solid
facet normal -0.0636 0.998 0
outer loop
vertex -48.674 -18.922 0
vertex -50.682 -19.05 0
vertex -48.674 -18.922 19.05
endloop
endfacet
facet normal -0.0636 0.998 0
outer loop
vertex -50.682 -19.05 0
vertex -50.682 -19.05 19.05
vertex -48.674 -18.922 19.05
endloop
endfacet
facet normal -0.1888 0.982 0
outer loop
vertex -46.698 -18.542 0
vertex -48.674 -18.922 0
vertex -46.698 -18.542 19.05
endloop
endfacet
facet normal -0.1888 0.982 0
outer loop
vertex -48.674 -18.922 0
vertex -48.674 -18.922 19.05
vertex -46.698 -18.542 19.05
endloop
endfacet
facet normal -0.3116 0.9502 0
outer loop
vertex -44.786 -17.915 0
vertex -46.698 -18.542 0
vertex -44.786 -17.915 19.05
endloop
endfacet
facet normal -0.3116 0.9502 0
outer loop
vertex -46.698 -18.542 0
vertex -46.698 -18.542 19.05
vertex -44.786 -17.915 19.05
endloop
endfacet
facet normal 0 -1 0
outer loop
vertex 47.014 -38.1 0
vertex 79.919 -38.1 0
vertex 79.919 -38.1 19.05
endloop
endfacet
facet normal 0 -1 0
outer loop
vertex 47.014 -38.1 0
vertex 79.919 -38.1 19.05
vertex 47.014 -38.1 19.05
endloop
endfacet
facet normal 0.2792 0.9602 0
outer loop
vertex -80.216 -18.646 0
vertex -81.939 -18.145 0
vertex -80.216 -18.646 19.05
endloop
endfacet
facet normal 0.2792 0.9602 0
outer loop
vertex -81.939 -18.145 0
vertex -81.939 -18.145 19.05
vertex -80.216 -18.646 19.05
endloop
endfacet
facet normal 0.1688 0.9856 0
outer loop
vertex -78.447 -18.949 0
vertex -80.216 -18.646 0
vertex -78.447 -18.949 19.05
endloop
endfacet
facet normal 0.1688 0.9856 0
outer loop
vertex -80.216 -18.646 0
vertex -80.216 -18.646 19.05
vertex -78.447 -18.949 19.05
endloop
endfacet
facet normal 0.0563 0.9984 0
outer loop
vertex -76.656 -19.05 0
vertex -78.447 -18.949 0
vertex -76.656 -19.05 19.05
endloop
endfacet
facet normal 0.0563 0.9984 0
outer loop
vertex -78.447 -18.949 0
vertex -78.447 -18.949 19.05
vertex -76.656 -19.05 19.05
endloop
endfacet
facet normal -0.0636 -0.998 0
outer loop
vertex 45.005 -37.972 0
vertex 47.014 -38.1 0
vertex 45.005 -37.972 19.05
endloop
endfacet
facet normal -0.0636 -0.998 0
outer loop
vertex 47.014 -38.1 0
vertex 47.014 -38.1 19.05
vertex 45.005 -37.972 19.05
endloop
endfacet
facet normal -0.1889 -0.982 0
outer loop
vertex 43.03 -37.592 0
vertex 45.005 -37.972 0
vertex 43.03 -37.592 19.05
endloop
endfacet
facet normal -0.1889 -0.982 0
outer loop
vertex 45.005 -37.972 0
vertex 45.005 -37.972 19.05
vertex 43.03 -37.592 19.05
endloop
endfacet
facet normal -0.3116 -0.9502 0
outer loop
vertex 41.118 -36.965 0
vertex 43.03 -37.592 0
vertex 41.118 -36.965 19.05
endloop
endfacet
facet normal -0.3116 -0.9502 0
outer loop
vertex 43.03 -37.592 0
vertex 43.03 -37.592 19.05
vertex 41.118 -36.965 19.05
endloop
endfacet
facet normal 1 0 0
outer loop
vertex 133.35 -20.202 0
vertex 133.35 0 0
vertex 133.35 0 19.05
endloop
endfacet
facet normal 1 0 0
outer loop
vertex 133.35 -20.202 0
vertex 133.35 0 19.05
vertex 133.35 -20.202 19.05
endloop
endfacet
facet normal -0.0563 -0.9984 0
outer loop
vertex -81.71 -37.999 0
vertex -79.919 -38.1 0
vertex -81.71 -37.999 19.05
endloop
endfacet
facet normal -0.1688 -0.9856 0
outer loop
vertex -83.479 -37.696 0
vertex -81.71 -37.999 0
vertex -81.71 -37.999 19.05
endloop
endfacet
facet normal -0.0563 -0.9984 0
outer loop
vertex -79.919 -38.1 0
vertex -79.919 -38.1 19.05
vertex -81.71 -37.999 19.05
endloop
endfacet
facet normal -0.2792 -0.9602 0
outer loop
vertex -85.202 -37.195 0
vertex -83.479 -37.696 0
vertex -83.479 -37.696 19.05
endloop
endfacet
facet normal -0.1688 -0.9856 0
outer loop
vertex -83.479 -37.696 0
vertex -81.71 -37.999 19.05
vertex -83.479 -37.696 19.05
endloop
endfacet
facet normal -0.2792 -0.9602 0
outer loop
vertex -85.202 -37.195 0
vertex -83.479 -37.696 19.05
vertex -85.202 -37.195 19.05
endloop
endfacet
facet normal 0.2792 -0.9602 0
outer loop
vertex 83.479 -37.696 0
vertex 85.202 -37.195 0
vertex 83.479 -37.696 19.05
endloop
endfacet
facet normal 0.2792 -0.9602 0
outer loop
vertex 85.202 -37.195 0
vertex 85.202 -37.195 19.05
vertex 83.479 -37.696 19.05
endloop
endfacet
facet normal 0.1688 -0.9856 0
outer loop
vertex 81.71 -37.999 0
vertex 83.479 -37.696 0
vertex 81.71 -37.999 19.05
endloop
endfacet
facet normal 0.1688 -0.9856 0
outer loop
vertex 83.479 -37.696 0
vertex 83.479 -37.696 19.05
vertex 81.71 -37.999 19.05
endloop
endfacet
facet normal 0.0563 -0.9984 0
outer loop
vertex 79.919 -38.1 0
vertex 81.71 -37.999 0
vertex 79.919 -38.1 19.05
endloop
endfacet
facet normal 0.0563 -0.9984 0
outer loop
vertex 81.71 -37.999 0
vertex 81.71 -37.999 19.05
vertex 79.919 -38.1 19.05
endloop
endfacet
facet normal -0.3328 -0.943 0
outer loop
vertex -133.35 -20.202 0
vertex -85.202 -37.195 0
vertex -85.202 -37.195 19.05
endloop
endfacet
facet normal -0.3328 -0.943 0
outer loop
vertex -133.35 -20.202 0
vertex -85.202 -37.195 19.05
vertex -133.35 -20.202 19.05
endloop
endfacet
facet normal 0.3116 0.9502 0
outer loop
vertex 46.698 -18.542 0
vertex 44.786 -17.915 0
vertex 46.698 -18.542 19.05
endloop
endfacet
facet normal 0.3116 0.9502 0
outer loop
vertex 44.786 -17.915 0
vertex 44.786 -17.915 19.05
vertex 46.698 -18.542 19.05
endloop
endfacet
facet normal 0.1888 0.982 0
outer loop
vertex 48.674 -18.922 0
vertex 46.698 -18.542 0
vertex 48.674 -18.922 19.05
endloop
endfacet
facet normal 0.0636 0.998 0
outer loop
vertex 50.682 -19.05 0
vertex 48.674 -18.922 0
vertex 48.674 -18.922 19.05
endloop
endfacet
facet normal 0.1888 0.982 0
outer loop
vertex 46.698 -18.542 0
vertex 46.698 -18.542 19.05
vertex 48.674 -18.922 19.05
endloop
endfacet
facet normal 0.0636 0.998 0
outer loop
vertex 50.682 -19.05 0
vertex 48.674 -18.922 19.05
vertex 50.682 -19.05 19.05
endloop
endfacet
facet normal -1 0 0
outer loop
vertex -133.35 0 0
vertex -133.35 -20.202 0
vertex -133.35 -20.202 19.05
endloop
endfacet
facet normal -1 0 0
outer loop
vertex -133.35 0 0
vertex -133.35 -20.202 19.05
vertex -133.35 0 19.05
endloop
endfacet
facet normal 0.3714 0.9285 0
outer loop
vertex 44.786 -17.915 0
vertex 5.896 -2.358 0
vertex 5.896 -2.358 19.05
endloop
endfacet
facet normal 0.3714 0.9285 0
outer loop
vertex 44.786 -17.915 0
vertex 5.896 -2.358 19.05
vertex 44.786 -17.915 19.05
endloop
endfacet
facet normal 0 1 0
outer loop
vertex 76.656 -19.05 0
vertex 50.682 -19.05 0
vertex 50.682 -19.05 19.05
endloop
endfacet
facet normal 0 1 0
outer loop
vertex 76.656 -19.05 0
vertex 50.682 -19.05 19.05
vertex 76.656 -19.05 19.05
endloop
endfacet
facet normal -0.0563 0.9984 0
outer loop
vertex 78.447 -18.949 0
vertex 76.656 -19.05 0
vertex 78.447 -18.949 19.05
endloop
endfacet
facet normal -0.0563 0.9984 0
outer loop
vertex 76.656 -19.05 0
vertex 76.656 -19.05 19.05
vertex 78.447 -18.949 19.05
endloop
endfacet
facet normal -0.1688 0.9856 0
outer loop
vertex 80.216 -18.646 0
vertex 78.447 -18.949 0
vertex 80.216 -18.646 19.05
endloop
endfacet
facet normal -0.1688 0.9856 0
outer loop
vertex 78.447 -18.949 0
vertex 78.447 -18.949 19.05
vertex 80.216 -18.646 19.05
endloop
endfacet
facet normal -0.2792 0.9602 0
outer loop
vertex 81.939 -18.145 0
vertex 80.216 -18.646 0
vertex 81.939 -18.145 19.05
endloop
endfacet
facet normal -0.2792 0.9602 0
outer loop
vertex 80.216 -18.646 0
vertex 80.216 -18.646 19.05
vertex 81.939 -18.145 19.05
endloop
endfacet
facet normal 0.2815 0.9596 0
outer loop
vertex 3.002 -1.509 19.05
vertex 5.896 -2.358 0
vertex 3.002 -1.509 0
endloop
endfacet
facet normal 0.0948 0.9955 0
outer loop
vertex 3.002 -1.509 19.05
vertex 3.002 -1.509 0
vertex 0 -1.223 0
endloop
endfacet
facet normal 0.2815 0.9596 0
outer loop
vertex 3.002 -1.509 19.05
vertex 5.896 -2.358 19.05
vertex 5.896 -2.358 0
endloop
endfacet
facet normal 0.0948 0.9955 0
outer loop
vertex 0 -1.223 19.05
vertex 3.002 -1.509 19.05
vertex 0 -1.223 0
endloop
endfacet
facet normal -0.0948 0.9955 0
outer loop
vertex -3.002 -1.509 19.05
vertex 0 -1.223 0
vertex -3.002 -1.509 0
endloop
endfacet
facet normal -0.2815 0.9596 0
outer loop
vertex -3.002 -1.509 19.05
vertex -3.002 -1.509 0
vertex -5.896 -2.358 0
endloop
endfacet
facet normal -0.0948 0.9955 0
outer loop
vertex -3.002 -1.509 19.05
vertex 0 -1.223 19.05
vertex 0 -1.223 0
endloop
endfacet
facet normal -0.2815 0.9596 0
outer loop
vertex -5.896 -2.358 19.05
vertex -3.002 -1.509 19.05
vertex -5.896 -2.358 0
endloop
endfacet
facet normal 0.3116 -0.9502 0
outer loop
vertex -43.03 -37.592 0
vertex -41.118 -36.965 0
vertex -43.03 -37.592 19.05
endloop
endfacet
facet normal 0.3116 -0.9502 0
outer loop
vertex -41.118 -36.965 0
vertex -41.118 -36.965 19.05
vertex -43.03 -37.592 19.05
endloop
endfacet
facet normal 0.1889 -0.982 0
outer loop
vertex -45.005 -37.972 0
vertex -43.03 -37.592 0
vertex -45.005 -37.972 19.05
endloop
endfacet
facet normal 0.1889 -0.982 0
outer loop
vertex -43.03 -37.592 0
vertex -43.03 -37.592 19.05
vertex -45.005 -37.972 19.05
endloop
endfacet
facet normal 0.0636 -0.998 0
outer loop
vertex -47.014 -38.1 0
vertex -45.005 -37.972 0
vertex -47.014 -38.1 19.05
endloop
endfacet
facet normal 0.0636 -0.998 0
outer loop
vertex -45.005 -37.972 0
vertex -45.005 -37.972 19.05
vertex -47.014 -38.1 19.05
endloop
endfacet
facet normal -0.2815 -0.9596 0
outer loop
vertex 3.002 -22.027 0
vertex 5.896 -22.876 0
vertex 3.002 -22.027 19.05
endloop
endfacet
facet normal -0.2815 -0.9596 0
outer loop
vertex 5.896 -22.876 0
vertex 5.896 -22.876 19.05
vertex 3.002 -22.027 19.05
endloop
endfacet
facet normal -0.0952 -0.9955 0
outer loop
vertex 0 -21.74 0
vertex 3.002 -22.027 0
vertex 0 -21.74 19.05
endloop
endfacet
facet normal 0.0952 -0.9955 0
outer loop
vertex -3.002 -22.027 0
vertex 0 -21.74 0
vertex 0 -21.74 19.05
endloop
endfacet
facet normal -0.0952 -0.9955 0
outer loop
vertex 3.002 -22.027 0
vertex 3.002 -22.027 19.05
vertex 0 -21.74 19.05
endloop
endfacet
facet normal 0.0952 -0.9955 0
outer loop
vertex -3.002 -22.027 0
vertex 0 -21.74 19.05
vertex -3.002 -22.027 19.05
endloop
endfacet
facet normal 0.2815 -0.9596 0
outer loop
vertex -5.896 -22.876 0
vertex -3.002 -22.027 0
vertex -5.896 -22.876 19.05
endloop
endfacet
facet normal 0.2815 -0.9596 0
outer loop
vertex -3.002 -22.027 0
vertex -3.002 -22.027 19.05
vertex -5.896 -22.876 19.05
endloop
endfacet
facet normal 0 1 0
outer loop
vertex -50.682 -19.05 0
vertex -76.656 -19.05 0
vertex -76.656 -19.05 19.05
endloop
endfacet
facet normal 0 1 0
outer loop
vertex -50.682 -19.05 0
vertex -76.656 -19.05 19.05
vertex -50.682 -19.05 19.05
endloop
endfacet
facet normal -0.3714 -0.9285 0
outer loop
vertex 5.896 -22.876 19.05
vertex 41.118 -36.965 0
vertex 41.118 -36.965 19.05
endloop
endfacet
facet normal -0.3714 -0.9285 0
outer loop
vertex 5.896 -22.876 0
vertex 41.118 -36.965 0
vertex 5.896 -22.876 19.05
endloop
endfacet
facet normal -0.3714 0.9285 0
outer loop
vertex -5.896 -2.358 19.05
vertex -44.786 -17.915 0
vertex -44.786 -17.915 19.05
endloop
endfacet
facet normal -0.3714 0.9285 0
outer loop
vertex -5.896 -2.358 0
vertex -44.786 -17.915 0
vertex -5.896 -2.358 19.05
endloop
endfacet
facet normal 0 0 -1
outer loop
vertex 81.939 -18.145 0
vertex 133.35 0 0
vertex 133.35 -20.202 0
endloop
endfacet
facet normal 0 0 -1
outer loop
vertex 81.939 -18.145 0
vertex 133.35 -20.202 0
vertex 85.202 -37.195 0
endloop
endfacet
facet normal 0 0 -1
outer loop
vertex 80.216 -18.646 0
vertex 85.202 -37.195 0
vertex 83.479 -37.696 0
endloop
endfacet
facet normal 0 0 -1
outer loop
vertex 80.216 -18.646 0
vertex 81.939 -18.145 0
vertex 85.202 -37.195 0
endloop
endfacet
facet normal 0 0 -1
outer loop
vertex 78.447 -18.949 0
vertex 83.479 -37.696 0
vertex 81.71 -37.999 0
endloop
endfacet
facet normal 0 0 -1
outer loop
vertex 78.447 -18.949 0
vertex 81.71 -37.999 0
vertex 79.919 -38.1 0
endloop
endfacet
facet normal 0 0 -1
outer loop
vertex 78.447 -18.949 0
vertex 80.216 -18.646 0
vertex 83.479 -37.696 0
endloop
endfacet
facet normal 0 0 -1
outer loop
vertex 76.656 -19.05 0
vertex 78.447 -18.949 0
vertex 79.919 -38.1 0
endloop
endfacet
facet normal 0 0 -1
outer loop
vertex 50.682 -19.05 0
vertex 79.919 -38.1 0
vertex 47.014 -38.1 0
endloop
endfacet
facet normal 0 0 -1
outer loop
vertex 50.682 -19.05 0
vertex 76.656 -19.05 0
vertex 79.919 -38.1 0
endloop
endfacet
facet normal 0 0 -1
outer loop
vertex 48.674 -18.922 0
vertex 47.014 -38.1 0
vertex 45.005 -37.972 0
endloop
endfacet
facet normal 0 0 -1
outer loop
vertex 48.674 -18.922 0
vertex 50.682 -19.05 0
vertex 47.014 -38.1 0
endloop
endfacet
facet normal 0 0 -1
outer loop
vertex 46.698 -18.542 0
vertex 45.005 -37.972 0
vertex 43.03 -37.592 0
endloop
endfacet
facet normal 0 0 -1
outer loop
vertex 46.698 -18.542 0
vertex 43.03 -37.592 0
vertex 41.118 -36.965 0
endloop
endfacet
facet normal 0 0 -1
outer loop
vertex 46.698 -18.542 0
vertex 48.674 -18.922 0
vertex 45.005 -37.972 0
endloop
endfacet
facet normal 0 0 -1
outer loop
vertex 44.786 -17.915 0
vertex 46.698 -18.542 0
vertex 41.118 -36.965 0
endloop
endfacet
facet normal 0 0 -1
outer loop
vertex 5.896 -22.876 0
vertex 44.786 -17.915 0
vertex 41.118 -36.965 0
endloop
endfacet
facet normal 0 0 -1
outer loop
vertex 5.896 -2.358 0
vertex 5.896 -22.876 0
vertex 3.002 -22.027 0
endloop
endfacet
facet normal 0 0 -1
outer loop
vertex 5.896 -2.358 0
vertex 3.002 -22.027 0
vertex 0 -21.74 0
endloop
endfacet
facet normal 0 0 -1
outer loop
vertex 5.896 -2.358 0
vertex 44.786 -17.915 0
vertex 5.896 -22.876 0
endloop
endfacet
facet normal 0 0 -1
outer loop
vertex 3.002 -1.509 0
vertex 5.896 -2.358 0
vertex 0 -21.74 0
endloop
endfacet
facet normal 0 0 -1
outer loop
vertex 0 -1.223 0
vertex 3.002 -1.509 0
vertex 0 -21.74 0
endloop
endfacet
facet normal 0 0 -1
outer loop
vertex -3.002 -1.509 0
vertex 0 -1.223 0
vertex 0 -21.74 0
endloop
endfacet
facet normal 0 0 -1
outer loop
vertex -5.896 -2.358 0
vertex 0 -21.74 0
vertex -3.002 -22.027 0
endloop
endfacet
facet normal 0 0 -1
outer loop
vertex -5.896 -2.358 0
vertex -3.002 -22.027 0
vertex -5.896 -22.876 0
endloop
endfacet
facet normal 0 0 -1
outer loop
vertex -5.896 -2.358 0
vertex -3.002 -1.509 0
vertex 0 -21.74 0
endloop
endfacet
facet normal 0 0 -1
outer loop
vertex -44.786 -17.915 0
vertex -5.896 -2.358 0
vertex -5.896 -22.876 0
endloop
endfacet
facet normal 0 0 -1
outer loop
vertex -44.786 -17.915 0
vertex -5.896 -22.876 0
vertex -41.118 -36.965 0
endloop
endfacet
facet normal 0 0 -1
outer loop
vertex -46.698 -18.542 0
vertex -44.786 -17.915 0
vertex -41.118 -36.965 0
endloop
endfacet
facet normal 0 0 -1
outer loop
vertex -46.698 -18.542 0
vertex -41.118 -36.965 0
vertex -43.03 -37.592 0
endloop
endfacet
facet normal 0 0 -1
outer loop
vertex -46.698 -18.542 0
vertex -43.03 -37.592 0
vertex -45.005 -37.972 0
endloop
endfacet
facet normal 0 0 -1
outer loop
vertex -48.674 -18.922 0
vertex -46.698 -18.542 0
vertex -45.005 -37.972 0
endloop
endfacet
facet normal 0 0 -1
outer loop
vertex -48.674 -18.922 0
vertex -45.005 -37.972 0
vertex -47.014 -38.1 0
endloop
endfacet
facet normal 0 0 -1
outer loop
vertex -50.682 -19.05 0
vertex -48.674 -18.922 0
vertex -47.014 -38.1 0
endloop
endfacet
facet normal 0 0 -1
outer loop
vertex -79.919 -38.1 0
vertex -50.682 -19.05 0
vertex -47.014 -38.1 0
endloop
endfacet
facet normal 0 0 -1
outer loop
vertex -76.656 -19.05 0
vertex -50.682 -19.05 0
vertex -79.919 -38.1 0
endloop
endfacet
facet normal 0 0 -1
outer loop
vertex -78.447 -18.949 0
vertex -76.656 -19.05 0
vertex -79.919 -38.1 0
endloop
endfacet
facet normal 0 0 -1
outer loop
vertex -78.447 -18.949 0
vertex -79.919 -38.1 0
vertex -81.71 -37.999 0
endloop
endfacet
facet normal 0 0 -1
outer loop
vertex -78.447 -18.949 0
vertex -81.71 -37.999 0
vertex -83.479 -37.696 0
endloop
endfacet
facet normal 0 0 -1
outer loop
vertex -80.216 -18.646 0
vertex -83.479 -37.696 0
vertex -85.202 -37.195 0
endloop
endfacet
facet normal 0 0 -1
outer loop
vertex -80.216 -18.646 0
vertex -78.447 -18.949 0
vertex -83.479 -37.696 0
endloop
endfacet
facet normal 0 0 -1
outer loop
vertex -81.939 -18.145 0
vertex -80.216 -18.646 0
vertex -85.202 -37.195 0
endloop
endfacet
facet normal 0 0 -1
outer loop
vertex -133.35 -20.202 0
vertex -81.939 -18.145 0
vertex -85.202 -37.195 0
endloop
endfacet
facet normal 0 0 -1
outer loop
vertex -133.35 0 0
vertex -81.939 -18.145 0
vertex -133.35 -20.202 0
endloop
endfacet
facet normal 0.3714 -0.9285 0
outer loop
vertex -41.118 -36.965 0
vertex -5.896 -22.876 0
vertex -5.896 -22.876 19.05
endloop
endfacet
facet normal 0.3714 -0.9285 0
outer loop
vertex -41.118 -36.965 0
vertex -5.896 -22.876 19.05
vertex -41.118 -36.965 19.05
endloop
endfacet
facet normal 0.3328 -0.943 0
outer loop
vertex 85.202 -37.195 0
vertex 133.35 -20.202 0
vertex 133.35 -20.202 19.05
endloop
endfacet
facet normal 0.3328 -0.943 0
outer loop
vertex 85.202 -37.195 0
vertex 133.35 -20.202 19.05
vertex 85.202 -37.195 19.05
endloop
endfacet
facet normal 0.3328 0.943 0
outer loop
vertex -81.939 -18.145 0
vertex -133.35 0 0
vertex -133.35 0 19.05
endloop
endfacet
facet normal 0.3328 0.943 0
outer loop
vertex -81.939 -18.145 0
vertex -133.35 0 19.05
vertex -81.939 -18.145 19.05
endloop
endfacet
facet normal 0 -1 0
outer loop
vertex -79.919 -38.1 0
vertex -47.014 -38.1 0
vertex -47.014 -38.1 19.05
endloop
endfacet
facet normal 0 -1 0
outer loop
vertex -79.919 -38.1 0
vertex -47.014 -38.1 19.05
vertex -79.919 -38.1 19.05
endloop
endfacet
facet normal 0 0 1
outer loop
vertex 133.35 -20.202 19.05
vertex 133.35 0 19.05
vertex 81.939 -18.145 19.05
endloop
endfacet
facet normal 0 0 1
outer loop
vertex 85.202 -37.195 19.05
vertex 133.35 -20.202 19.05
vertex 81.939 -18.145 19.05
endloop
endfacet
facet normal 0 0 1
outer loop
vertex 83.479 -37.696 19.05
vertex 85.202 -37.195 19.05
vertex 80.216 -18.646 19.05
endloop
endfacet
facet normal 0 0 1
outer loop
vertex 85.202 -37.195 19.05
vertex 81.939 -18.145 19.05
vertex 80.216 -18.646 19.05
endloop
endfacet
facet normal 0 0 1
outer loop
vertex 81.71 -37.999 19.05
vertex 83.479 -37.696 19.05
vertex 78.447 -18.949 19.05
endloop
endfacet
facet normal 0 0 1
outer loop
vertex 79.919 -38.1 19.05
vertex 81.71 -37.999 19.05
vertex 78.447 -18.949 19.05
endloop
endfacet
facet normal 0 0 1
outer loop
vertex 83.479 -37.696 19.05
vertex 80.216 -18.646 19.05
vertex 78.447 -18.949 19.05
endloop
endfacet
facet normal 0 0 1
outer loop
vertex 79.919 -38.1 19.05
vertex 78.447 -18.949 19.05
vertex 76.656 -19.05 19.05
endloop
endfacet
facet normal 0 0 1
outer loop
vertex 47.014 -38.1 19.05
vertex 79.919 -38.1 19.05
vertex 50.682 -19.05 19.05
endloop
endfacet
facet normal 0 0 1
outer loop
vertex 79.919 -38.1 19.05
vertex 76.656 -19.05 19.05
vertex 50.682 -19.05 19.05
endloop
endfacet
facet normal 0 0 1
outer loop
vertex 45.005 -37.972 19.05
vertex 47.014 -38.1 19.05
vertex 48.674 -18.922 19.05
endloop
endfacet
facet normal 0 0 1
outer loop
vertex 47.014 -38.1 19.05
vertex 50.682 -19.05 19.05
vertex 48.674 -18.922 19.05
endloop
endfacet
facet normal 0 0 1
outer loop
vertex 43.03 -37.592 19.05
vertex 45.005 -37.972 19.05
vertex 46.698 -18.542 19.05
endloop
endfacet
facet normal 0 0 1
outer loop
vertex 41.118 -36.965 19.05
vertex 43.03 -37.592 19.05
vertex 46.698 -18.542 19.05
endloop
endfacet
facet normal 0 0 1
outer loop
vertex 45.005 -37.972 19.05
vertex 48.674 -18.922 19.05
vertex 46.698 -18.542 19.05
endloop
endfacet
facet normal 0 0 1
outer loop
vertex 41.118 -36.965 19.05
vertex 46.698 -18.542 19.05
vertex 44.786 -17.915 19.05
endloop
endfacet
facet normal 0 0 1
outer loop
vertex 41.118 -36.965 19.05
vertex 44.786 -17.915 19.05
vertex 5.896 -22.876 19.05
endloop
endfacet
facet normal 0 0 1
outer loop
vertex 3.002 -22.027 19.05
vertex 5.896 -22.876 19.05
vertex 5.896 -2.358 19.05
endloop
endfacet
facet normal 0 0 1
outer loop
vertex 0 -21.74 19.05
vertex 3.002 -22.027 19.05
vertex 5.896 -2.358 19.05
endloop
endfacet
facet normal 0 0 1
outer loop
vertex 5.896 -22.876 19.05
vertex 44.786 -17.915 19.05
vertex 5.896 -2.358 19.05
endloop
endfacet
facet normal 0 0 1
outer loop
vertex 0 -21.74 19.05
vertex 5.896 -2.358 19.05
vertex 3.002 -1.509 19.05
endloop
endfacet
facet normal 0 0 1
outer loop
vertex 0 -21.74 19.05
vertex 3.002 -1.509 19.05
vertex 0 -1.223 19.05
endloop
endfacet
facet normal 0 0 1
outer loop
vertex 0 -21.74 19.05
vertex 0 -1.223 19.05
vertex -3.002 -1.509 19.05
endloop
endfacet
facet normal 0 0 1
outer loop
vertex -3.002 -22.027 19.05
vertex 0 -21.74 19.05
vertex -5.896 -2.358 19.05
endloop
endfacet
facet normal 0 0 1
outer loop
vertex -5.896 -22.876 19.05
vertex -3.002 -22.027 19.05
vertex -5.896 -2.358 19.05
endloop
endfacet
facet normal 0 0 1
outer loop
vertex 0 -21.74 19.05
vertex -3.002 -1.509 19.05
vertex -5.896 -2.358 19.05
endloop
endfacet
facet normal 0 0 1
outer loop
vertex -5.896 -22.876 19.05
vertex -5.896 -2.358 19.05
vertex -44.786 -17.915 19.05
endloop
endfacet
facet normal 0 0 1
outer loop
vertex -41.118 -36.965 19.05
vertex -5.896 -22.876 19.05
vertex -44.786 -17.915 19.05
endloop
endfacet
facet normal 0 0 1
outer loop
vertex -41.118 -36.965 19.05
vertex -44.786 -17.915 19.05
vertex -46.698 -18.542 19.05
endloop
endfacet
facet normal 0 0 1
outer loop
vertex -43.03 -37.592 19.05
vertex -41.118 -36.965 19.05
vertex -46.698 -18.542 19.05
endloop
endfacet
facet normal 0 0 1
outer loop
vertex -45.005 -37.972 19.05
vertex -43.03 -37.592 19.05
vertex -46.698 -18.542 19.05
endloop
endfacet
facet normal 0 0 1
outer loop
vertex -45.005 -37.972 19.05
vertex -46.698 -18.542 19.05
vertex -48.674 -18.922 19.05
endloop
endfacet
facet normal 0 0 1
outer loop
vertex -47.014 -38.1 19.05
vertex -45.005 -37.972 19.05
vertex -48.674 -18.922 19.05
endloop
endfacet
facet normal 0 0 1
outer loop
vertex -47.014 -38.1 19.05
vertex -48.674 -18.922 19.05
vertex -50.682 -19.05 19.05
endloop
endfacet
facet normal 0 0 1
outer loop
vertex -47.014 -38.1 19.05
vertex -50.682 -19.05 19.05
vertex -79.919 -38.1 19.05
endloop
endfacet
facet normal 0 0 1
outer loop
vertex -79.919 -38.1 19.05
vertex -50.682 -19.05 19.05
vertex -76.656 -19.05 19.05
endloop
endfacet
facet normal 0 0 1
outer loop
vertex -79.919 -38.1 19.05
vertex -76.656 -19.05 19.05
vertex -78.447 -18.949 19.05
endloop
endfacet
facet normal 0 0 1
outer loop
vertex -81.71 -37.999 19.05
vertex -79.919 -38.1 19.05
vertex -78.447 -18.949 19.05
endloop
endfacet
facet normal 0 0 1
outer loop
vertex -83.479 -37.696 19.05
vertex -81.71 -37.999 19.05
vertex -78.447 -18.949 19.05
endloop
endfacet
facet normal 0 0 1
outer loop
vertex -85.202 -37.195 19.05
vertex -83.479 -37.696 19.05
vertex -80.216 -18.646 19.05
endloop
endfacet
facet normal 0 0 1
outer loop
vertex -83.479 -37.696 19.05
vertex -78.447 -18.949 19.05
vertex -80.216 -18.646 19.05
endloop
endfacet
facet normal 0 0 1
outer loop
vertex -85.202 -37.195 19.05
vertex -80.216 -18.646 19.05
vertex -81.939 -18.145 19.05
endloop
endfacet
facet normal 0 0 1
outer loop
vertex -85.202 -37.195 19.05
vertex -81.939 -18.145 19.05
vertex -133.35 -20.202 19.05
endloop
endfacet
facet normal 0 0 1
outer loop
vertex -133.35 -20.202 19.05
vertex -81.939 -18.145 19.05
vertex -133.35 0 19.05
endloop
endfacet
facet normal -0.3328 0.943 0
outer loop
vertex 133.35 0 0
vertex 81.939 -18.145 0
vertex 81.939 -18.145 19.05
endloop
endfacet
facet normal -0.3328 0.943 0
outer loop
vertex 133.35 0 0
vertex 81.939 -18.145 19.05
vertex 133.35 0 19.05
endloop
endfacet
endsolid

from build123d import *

# Parameters (mm, degrees)
BOSS_EXTRUDE1_DEPTH = 19.05
FILLET1_R           = 15.875


with BuildPart() as part:
    # Sketch1 → Boss-Extrude1 (new body)
    with BuildSketch(Plane.XY):
        Polygon((0, 0), (47.625, -19.05), (79.375, -19.05), (133.35, 0), (133.35, -20.201691705), (82.638126498, -38.1), (43.956305212, -38.1), (0, -20.517477915), (-43.956305212, -38.1), (-82.638126498, -38.1), (-133.35, -20.201691705), (-133.35, 0), (-79.375, -19.05), (-47.625, -19.05), align=None)
    extrude(amount=BOSS_EXTRUDE1_DEPTH)

    # Fillet1
    fillet1_edges = [part.edges().sort_by_distance(p)[0] for p in [
        (0, 0, 9.525),
        (47.625, -19.05, 9.525),
        (79.375, -19.05, 9.525),
        (82.638126498, -38.1, 9.525),
        (43.956305212, -38.1, 9.525),
        (0, -20.517477915, 9.525),
        (-43.956305212, -38.1, 9.525),
        (-82.638126498, -38.1, 9.525),
        (-79.375, -19.05, 9.525),
        (-47.625, -19.05, 9.525),
    ]]
    fillet(fillet1_edges, radius=FILLET1_R)


solid = part.part
